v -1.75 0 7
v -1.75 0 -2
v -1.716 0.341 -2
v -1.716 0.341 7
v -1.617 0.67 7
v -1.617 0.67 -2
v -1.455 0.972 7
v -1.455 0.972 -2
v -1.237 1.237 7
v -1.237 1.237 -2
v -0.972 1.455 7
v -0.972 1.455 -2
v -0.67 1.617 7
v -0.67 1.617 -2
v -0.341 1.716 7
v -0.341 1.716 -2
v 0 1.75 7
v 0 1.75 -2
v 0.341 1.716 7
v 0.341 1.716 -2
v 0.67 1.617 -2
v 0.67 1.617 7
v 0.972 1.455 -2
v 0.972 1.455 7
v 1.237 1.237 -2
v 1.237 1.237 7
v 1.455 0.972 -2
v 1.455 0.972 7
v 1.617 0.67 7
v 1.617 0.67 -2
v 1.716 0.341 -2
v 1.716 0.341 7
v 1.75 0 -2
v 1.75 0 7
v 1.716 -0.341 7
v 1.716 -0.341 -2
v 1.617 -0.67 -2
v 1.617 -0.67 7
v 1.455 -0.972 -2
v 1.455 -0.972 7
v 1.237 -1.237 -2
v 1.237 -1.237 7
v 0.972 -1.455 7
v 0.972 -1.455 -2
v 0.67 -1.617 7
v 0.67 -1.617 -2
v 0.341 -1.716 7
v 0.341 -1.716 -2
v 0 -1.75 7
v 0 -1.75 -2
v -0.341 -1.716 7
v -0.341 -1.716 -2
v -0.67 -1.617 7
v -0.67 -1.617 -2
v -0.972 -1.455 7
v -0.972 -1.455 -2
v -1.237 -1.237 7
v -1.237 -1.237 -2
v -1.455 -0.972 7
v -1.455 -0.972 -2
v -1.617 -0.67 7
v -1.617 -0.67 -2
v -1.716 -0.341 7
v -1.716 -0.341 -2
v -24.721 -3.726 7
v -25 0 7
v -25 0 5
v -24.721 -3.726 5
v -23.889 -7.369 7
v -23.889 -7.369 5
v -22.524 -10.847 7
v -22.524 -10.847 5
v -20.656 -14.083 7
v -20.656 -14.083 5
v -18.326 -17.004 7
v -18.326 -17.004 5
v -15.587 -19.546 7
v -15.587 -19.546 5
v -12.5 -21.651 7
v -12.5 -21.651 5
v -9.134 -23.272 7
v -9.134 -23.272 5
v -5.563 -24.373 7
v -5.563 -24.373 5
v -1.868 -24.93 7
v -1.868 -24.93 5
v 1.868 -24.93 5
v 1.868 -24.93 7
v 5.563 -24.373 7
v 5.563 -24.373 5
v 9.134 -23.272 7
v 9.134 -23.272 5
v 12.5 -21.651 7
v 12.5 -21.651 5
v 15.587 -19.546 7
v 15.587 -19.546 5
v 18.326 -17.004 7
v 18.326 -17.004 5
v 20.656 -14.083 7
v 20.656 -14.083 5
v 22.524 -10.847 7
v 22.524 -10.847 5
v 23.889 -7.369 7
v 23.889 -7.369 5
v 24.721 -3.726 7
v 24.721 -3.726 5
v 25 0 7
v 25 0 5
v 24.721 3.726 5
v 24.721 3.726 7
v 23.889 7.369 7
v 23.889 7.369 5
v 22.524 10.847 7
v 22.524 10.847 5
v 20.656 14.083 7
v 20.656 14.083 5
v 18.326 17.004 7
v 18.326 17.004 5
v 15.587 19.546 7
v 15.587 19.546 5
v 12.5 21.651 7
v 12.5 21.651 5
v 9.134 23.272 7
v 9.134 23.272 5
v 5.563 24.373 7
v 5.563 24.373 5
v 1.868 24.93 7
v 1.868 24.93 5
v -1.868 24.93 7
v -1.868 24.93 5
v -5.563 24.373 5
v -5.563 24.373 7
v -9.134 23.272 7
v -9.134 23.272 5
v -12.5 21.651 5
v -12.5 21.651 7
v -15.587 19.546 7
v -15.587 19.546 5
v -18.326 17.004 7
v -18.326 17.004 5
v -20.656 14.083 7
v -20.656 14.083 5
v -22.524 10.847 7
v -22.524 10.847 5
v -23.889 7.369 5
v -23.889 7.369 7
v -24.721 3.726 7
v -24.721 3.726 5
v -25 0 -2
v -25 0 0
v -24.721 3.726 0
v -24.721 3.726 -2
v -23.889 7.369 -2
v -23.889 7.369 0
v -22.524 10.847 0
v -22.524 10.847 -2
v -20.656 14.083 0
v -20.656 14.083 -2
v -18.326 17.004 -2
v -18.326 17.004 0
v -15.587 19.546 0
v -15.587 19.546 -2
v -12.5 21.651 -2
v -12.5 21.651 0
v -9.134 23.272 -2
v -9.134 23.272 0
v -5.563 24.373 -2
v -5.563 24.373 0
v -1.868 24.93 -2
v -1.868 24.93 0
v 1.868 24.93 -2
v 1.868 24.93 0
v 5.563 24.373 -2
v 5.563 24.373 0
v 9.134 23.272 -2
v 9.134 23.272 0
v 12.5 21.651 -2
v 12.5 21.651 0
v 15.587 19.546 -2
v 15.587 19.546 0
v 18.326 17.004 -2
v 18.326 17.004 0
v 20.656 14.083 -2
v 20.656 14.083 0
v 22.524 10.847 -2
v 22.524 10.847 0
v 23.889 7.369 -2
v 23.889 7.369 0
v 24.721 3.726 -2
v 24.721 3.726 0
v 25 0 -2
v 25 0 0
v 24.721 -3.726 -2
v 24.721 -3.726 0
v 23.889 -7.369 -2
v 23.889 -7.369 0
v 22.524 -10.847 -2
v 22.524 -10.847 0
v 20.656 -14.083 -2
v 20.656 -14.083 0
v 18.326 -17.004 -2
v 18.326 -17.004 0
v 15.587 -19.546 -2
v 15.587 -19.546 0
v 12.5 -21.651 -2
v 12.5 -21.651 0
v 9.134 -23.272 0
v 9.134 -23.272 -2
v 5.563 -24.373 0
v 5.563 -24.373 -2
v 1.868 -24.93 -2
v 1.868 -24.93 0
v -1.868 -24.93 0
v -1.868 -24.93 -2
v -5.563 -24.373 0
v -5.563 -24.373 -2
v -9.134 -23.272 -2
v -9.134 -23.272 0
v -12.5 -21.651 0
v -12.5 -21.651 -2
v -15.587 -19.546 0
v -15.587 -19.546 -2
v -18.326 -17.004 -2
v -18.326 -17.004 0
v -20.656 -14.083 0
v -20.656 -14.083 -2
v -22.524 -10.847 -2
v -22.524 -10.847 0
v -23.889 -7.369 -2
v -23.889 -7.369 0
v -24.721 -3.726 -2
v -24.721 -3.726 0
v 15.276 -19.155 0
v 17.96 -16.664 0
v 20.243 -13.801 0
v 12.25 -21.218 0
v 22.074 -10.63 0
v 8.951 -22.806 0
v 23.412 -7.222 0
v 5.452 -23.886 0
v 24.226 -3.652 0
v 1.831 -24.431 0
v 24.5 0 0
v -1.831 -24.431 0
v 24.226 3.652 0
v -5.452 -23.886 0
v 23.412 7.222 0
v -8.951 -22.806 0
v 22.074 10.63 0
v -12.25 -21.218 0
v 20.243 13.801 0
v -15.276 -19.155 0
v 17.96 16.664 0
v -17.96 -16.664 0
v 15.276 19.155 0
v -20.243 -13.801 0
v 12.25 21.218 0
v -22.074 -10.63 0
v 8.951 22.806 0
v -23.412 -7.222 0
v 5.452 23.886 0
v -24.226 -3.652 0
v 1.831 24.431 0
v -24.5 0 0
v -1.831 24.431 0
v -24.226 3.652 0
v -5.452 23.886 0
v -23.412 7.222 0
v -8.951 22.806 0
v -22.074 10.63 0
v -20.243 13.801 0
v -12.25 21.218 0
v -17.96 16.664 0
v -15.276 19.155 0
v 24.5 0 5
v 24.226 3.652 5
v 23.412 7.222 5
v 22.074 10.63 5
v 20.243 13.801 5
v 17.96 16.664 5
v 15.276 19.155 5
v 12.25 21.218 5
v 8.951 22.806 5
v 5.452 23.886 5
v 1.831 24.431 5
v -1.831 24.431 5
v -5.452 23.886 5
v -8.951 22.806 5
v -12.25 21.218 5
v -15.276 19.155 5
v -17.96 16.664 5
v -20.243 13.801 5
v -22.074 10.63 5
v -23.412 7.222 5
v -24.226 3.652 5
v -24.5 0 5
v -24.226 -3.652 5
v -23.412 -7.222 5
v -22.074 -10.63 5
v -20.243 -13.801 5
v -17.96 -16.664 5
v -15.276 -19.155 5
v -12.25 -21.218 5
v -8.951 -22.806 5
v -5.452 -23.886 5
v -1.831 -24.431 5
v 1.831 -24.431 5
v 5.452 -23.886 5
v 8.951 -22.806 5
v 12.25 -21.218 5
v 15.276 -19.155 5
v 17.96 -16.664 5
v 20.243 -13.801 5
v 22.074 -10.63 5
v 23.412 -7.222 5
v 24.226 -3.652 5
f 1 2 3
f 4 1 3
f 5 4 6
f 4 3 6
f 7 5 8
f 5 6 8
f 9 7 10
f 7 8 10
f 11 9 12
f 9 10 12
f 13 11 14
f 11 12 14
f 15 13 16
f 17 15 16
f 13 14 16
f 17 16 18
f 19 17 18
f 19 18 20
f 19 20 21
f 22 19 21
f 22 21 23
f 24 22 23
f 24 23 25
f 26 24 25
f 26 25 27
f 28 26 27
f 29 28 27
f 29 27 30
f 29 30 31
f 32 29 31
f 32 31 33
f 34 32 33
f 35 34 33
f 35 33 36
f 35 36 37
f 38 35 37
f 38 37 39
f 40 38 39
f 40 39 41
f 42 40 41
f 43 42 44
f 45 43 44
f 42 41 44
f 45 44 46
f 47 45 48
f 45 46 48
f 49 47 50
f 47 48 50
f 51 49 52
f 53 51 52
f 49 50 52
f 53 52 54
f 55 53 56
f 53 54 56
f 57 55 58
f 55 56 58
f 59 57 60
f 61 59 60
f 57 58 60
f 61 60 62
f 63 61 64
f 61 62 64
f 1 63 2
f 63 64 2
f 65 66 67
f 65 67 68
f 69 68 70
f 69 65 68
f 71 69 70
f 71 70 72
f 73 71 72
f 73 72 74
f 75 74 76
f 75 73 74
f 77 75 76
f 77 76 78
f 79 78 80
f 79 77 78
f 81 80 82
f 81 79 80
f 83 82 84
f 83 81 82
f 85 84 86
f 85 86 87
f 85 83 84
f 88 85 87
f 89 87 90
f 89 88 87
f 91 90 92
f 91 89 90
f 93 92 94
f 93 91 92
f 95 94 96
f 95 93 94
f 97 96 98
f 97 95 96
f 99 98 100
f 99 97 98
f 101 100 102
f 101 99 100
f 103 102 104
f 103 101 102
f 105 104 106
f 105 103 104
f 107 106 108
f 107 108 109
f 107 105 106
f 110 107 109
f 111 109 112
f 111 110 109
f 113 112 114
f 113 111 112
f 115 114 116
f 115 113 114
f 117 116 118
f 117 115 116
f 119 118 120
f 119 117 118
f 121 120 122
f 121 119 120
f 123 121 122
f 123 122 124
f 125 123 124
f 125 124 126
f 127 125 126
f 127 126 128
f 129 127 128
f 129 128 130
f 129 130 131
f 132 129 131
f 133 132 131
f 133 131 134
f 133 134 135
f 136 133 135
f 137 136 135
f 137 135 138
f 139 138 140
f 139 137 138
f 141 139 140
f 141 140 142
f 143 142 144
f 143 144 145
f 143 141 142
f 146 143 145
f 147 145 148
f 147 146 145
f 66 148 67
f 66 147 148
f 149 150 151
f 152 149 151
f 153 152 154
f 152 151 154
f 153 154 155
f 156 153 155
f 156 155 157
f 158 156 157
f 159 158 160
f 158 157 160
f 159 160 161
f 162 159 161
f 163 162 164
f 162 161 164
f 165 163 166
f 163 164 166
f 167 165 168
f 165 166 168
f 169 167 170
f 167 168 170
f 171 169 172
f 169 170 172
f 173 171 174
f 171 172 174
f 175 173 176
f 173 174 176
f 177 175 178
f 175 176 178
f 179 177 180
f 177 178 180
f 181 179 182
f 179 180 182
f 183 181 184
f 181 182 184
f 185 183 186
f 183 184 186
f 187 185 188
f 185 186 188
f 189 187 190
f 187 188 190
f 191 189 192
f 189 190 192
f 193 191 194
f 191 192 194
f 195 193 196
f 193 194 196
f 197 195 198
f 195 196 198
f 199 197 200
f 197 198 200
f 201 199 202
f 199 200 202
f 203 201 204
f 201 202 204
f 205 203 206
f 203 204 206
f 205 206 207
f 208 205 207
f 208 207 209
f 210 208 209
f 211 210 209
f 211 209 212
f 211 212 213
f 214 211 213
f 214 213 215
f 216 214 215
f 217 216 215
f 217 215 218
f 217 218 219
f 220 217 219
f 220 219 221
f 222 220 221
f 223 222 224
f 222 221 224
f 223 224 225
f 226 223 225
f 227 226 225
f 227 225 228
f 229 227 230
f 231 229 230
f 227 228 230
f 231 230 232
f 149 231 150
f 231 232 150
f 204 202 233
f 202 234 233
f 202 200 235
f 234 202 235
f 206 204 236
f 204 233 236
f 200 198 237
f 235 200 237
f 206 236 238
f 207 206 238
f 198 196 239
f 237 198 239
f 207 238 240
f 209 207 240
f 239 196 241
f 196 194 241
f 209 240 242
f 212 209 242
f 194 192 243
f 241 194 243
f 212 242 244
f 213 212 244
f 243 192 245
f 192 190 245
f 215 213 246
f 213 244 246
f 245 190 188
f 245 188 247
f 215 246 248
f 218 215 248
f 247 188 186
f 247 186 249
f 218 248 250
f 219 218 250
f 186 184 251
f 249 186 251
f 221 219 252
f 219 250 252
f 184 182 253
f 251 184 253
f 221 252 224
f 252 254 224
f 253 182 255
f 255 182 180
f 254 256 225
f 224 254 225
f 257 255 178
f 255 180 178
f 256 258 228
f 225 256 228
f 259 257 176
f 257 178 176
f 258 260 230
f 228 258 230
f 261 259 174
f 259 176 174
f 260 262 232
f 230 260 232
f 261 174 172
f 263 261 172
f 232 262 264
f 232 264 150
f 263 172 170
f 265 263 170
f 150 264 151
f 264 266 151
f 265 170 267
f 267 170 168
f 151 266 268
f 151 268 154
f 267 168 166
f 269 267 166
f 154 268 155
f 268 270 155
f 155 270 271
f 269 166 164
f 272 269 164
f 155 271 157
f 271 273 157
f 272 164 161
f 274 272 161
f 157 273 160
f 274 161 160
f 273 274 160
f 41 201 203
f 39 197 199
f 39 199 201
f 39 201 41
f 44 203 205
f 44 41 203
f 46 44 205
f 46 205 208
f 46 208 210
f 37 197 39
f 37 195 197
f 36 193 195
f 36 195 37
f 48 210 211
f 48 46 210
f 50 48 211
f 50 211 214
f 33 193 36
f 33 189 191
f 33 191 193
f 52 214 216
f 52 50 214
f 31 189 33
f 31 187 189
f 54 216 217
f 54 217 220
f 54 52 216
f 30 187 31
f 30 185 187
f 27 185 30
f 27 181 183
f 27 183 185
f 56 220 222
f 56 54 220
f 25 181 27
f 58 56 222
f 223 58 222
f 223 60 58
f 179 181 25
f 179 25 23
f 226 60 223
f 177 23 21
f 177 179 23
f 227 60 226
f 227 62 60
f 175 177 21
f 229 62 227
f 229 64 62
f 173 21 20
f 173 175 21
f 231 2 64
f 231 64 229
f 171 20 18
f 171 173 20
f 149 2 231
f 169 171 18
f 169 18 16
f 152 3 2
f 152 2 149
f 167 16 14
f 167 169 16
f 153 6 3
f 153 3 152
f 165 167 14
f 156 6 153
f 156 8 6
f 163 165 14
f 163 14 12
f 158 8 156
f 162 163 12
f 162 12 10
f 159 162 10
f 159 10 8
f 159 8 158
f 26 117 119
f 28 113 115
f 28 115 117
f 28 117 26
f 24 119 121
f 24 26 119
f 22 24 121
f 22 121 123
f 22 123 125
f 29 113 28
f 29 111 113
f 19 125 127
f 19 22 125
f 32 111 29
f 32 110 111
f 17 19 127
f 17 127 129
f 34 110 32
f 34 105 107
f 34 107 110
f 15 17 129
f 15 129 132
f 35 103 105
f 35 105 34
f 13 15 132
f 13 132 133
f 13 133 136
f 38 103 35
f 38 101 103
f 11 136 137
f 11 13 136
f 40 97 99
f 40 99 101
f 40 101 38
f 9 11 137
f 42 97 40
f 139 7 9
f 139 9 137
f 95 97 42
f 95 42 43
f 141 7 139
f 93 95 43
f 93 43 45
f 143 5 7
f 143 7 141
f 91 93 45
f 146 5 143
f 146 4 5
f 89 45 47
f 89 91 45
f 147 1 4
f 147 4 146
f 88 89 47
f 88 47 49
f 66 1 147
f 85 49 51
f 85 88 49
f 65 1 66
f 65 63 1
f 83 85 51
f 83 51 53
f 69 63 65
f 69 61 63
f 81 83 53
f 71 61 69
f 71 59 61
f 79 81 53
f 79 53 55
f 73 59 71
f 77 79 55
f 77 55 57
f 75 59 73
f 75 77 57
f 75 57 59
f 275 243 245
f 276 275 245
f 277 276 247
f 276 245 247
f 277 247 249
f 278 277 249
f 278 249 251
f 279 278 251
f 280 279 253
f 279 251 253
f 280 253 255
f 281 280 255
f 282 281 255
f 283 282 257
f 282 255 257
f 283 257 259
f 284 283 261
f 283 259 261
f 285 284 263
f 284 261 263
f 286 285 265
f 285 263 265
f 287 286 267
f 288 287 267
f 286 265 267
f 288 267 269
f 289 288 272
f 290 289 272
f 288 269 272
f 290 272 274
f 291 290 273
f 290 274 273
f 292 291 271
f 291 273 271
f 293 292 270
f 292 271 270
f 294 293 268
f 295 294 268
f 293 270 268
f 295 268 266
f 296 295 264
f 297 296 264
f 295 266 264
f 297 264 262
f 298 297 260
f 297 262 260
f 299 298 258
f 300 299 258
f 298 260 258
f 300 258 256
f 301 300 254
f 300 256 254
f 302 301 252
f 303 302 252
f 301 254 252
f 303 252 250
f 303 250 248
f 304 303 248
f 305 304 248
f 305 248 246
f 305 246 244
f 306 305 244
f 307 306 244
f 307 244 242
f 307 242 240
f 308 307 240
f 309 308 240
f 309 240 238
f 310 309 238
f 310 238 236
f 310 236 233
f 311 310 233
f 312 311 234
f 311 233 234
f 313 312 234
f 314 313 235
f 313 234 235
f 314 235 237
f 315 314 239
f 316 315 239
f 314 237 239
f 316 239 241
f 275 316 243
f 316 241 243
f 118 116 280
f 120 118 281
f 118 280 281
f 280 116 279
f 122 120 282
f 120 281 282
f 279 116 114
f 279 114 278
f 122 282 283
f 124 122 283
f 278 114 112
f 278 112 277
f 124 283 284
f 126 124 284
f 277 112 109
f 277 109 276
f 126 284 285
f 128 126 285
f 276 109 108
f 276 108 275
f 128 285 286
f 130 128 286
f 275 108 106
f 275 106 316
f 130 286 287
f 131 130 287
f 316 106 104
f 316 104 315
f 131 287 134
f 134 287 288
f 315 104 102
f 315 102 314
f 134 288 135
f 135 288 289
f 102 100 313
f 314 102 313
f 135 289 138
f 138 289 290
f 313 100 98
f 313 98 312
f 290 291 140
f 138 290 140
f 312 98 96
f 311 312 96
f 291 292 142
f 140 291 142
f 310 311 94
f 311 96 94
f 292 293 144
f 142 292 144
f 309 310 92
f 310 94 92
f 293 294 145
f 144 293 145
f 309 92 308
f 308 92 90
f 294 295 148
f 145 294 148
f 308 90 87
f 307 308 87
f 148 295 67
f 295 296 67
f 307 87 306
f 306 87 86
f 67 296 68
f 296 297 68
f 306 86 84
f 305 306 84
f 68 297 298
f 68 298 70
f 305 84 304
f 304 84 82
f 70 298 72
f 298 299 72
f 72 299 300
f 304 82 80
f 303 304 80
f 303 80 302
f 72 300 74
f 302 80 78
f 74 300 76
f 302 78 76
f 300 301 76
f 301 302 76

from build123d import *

# Parameters (mm, degrees)
ESQUISSE1_R             = 24.5
BOSS_EXTRU_1_DEPTH      = 5
ESQUISSE2_R             = 25
BOSS_EXTRU_2_DEPTH      = 2
BOSS_EXTRU_4_START      = 2
ESQUISSE5_R             = 25
BOSS_EXTRU_4_DEPTH      = 2
ESQUISSE4_R             = 1.75
ENL_V_MAT_EXTRU_1_DEPTH = 37.482872694


with BuildPart() as part:
    # Esquisse1 → Boss.-Extru.1 (new body)
    with BuildSketch(Plane.XY):
        Circle(ESQUISSE1_R)
    extrude(amount=BOSS_EXTRU_1_DEPTH)

    # Esquisse2 → Boss.-Extru.2 (add)
    with BuildSketch(Plane(origin=(0, 0, 0), x_dir=(-1, 0, 0), z_dir=(0, 0, -1))):
        Circle(ESQUISSE2_R)
    extrude(amount=BOSS_EXTRU_2_DEPTH)

    # Esquisse5 → Boss.-Extru.4 (add)
    with BuildSketch(Plane.XY.offset(5).offset(BOSS_EXTRU_4_START)):
        with Locations(Location((0, 0, 0), (0, 0, 180))):
            Circle(ESQUISSE5_R)
    extrude(amount=-BOSS_EXTRU_4_DEPTH)

    # Esquisse4 → Enlèv. mat.-Extru.1 (cut, through all)
    with BuildSketch(Plane(origin=(0, 0, -2), x_dir=(-1, 0, 0), z_dir=(0, 0, -1))):
        Circle(ESQUISSE4_R)
    extrude(amount=-ENL_V_MAT_EXTRU_1_DEPTH, mode=Mode.SUBTRACT)


solid = part.part
